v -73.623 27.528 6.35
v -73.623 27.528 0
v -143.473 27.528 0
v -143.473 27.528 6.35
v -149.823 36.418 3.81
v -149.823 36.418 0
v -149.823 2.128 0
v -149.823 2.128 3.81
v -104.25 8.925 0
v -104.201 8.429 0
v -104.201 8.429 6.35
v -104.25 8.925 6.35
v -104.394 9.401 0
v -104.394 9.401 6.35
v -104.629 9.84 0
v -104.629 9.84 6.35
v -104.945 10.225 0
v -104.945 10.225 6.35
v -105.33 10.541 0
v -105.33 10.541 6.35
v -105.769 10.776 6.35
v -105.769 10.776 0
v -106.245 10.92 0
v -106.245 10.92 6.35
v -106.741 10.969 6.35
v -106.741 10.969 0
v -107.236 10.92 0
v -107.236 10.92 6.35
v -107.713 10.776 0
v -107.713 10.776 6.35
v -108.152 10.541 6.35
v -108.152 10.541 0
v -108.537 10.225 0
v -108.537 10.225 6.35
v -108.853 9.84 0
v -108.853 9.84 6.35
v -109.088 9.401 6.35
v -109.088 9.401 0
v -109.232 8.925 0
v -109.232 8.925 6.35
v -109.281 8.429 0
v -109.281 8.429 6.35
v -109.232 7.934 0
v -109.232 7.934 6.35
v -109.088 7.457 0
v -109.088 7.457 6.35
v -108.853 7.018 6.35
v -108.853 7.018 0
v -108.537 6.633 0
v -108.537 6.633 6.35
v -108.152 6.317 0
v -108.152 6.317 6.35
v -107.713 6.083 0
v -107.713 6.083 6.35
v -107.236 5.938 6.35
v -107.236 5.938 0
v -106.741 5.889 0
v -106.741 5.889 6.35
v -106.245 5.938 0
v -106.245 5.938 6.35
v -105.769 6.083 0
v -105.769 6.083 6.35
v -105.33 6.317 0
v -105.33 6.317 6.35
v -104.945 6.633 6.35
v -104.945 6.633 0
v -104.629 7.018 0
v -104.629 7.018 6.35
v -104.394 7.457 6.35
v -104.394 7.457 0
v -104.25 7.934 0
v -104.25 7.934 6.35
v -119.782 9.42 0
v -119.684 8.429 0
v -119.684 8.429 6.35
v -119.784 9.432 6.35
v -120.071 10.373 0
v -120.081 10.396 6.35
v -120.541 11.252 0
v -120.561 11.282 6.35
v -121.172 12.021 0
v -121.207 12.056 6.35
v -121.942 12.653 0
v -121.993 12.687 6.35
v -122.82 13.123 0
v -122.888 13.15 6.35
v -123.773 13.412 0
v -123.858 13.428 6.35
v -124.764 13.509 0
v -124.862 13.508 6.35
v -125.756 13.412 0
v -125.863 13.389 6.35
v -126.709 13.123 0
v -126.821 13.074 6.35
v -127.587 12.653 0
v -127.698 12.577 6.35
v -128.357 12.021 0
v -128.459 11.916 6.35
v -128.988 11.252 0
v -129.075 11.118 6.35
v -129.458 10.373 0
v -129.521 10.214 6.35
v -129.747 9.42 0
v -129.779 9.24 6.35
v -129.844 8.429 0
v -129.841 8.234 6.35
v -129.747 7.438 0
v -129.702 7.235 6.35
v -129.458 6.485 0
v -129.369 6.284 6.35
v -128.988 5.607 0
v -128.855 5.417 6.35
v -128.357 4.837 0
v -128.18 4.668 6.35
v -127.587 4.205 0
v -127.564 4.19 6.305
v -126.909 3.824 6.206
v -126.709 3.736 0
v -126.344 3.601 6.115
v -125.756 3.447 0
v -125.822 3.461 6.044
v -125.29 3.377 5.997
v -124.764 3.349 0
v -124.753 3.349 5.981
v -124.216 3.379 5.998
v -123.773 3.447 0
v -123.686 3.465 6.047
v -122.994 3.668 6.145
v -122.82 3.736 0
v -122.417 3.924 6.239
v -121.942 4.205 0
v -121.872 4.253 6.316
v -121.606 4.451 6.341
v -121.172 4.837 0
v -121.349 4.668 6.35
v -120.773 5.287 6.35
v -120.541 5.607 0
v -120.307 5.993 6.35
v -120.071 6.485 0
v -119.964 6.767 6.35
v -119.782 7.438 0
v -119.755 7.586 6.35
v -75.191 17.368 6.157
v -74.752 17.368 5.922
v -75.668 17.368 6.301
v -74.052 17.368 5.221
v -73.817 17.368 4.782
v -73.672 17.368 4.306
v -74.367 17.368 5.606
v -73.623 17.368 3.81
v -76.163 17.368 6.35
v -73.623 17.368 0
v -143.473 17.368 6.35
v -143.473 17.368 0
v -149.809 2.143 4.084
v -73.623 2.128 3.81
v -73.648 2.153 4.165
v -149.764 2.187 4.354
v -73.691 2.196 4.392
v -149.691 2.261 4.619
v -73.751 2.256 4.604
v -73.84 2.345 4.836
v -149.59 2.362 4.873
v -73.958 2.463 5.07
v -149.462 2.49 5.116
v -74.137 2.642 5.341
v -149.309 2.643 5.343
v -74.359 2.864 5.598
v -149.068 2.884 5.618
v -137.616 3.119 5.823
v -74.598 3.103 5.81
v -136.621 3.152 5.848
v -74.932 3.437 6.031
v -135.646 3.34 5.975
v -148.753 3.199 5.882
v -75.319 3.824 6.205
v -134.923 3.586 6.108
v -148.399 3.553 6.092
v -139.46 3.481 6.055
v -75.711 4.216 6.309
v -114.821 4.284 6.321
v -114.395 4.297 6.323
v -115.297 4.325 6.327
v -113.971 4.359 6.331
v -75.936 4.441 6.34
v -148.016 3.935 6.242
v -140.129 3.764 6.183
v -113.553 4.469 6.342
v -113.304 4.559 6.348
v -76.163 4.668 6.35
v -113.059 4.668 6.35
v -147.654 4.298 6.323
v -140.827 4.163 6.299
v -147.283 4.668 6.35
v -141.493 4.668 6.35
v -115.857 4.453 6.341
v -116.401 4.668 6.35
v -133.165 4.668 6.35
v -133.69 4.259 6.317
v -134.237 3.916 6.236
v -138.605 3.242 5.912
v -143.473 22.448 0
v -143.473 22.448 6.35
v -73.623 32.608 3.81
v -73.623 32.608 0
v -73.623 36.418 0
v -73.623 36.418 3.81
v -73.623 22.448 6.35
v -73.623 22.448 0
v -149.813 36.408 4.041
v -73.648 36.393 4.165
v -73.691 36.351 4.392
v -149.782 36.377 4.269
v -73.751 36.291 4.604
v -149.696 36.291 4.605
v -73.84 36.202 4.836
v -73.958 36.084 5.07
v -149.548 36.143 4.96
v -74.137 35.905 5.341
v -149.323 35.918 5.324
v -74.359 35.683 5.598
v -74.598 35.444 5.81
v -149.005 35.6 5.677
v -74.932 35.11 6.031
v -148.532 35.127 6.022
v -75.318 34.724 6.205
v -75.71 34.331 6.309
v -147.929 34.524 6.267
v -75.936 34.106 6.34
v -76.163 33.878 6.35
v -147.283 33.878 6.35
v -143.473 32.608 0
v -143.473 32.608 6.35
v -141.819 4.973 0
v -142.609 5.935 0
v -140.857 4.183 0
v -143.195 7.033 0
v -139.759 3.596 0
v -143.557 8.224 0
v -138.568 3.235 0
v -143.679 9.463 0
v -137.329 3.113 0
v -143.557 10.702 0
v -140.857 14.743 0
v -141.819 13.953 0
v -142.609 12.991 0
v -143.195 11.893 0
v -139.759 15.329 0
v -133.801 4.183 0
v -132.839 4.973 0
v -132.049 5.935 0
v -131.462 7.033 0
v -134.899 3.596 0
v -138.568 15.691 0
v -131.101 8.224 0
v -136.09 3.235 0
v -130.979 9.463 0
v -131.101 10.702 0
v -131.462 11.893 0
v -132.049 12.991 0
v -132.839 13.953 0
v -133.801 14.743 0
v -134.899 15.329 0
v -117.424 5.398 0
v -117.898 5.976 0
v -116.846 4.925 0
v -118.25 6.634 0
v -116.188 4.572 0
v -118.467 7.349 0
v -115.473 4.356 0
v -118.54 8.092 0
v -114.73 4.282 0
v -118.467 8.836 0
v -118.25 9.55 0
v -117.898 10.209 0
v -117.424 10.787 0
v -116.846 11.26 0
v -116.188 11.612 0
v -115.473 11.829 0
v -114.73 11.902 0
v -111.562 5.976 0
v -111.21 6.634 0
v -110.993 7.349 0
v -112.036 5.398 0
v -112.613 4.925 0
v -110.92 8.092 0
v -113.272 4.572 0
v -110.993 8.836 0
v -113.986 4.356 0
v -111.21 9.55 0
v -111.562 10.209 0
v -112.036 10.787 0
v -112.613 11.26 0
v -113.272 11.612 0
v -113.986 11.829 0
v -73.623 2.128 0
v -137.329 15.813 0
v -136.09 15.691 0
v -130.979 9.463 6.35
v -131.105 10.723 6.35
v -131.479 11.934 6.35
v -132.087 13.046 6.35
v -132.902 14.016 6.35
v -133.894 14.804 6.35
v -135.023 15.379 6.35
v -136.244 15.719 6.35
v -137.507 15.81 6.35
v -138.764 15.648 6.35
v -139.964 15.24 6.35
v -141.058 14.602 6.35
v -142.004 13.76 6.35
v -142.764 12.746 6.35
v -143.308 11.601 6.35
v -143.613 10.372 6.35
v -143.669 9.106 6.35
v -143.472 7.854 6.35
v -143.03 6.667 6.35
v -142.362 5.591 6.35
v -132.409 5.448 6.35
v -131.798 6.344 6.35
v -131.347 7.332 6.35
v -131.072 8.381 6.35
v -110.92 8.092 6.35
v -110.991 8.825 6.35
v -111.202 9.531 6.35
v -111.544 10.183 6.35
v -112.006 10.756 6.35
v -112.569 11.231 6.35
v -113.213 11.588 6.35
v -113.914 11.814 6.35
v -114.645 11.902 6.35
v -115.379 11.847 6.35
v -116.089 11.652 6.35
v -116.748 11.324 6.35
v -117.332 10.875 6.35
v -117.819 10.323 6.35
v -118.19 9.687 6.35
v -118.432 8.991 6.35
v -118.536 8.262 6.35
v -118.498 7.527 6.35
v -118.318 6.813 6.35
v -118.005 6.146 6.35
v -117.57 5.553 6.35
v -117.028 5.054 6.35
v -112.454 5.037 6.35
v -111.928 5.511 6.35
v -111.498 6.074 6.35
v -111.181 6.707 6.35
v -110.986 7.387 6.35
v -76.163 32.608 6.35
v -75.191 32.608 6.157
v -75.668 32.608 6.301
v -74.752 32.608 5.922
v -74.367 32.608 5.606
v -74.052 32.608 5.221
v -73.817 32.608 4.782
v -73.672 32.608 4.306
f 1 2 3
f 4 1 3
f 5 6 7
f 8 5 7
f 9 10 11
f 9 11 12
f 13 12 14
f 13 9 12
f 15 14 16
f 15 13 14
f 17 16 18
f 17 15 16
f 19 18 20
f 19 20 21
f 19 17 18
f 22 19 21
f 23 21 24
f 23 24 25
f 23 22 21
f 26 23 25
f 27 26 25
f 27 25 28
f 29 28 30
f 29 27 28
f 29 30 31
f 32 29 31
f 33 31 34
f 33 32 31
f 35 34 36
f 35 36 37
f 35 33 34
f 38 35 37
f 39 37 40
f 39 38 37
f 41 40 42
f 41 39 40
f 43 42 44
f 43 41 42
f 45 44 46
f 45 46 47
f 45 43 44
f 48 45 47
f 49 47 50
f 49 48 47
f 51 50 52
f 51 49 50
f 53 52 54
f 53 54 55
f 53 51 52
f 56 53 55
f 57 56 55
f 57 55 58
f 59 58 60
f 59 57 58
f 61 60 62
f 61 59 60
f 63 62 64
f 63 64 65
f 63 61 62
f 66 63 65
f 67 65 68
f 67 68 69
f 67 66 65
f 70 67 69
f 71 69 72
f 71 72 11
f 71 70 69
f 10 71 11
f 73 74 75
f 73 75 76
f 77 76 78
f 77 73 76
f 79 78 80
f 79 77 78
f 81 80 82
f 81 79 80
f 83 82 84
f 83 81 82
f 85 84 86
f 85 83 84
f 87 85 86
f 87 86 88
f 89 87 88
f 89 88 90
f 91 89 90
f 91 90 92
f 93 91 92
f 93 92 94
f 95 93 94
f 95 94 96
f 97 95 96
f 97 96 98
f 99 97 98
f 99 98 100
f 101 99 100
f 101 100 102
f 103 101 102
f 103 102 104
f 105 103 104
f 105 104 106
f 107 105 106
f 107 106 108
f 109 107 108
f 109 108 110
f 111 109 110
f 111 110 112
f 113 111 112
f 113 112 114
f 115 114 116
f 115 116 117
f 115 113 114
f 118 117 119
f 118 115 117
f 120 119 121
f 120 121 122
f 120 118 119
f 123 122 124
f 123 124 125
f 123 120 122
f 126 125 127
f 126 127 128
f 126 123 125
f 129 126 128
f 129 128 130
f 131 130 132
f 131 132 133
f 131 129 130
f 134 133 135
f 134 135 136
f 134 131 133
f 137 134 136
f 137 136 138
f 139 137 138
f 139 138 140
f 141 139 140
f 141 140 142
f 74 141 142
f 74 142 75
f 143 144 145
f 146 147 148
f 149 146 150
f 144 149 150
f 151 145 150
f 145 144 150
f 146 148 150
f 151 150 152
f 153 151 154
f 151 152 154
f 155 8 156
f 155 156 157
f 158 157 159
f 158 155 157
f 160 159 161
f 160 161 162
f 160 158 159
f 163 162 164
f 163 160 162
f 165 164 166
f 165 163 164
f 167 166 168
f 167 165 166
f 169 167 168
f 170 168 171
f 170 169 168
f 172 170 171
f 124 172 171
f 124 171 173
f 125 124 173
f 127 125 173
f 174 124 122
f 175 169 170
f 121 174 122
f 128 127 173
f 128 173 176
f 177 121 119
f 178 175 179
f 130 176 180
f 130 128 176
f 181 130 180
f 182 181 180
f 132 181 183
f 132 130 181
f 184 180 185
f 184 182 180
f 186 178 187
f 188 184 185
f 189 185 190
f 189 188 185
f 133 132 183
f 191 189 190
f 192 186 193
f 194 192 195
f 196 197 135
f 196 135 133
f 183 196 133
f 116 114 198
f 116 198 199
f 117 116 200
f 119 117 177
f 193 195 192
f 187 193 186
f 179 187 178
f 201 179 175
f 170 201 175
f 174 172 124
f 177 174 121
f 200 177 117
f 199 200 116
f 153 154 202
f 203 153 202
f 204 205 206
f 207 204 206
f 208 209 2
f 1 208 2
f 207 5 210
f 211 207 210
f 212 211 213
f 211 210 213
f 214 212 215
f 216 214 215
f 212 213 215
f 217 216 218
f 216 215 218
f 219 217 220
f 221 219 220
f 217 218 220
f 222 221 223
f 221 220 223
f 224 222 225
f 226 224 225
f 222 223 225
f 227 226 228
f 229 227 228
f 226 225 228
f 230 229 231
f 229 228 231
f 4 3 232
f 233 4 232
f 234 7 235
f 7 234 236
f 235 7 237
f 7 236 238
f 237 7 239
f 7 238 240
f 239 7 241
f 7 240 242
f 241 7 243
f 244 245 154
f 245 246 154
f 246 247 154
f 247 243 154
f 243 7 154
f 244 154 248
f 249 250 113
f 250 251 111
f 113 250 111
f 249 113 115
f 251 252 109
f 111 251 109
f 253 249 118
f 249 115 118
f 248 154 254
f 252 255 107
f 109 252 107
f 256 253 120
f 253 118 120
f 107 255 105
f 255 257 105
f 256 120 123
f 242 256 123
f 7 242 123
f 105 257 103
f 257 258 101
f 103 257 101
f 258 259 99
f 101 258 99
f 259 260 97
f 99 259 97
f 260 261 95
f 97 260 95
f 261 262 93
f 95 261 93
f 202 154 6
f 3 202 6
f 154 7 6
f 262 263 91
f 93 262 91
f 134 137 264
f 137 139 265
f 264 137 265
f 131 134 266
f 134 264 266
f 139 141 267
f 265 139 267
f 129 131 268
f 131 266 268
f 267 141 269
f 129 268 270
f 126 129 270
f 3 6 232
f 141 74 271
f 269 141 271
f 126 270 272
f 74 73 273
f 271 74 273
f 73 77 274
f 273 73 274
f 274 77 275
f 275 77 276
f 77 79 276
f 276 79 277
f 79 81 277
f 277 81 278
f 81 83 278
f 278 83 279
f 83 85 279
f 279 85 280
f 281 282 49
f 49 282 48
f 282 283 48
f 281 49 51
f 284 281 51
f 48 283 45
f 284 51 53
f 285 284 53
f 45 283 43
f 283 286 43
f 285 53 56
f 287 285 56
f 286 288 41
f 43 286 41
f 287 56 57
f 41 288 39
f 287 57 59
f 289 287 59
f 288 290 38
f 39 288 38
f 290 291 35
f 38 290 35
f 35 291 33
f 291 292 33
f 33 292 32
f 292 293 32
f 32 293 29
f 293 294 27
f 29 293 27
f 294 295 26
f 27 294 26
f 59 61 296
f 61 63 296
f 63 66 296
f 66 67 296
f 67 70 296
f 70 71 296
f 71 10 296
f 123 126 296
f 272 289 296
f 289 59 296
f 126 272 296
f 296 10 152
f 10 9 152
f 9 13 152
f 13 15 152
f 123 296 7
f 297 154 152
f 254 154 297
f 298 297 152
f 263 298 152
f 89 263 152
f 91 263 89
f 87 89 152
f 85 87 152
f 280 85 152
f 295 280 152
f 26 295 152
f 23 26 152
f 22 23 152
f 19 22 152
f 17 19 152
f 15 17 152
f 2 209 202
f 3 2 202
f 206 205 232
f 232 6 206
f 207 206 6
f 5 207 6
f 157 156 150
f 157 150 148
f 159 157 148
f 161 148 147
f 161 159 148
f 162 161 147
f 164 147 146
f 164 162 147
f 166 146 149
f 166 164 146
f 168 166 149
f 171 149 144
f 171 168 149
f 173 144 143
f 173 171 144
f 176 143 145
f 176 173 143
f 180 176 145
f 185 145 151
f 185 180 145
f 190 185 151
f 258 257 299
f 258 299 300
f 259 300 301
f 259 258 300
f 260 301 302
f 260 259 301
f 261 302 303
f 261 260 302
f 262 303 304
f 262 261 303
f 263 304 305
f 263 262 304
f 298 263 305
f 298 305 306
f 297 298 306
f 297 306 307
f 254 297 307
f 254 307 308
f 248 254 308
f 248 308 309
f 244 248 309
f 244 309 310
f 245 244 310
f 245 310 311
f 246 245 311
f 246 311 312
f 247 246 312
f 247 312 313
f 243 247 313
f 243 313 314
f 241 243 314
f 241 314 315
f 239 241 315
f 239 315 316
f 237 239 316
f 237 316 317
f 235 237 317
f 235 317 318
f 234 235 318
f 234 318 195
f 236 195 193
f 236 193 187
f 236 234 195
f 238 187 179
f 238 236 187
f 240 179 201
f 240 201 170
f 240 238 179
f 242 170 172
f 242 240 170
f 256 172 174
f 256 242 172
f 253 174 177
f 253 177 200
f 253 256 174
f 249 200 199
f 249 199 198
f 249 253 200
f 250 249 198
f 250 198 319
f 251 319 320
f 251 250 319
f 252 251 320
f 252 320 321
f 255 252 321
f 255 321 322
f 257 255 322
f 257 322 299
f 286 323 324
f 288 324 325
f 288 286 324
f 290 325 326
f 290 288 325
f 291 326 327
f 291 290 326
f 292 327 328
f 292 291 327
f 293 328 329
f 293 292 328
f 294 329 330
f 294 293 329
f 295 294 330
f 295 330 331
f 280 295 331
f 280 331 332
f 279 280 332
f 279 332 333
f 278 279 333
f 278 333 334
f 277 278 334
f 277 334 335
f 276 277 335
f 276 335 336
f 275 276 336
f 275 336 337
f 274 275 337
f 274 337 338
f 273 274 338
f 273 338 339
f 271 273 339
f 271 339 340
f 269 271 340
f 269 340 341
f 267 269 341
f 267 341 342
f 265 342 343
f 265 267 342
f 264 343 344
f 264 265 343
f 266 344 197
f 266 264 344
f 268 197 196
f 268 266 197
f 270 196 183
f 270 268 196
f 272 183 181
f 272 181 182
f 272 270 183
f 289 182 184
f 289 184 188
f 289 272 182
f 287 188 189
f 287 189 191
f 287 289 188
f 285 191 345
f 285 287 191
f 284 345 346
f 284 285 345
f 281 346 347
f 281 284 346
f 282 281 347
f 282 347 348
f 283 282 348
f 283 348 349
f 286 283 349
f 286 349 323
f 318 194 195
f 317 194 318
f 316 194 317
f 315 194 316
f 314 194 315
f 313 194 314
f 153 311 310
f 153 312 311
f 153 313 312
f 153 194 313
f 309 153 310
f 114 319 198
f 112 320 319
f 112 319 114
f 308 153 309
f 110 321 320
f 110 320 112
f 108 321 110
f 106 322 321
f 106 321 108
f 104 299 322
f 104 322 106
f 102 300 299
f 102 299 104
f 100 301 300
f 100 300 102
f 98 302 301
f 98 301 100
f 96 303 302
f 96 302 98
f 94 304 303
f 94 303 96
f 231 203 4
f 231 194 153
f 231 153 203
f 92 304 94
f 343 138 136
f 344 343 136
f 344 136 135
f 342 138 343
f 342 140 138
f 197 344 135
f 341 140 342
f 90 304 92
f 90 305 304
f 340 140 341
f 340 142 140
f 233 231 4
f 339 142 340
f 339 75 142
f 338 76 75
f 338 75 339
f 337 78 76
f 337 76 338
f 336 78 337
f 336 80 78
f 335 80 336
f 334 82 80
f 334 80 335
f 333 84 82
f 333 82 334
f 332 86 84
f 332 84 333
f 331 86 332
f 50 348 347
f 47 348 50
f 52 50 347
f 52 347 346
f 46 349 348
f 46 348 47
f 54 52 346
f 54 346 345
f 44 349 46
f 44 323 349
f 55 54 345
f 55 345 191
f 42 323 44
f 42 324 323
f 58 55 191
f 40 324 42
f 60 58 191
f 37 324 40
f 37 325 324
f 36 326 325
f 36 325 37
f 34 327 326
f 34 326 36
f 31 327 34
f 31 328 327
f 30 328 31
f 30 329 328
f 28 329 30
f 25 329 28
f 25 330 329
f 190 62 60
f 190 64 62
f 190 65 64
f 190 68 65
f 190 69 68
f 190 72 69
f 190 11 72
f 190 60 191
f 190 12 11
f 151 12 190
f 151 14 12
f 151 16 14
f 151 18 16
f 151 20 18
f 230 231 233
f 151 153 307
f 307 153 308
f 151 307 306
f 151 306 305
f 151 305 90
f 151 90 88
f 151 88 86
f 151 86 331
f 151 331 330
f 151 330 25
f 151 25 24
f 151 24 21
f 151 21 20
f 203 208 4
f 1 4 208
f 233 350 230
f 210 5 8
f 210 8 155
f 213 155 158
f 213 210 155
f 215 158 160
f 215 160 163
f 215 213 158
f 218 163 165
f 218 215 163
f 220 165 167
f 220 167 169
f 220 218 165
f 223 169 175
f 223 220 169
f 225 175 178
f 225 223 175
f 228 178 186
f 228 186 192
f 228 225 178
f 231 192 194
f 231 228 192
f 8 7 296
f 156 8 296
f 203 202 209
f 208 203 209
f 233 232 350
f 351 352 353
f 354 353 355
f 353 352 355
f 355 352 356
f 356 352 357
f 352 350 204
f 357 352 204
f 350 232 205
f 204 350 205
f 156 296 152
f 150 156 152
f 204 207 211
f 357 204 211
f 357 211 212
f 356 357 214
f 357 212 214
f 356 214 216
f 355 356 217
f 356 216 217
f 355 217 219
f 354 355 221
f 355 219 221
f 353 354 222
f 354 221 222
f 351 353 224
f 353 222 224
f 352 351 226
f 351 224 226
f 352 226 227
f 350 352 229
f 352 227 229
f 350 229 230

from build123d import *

# Parameters (mm, degrees)
F0_R         = 6.35
F0_R_2       = 5.08
F0_R_3       = 3.81
F0_R_4       = 2.54
F1_DEPTH     = 6.35
F2_T1_DEPTH  = 88.9
F2_T3_DEPTH  = 46.99
F2_T5_DEPTH  = 10.16
F2_T10_DEPTH = 27.94


# Not quite as in the source:
# - a fillet or chamfer that OpenCascade refuses, or shapes differently, is made with other operations: its cross-section is extruded or revolved along the edge and cut away or added


with BuildPart() as f1:
    # F0 (on Top) → F1 (new body)
    with BuildSketch(Plane.XY):
        Polygon((-149.8234506369, 2.128423816), (-73.6234506369, 2.128423816), (-73.6234506369, 17.368423816), (-143.4734506369, 17.368423816), (-143.4734506369, 22.448423816), (-73.6234506369, 22.448423816), (-73.6234506369, 27.528423816), (-143.4734506369, 27.528423816), (-143.4734506369, 32.608423816), (-73.6234506369, 32.608423816), (-73.6234506369, 36.418423816), (-149.8234506369, 36.418423816), align=None)
        with Locations((-137.3288496289, 9.4627772336)):
            Circle(F0_R, mode=Mode.SUBTRACT)
        with Locations((-124.7644872946, 8.4292863984)):
            Circle(F0_R_2, mode=Mode.SUBTRACT)
        with Locations((-114.7297660142, 8.0924675546)):
            Circle(F0_R_3, mode=Mode.SUBTRACT)
        with Locations((-106.7409519207, 8.4292863984)):
            Circle(F0_R_4, mode=Mode.SUBTRACT)
    extrude(amount=F1_DEPTH)

    # F2: fillet of radius 2.54 on 5 edges, made by hand

    # F2_s2 → F2_t1 (cut)
    with BuildSketch(Plane.YZ.offset(-156.1734506369)):
        with BuildLine():
            ThreePointArc((36.418423816, 3.81), (35.6744750402, 5.6060512242), (33.878423816, 6.35))
            Line((33.878423816, 6.35), (36.418423816, 6.35))
            Line((36.418423816, 6.35), (36.418423816, 3.81))
        make_face()
        with BuildLine():
            ThreePointArc((2.128423816, 3.81), (2.8723725918, 5.6060512242), (4.668423816, 6.35))
            Line((4.668423816, 6.35), (2.128423816, 6.35))
            Line((2.128423816, 6.35), (2.128423816, 3.81))
        make_face()
    extrude(amount=F2_T1_DEPTH, mode=Mode.SUBTRACT)

    # F2_s4 → F2_t3 (cut)
    with BuildSketch(Plane.XZ.offset(-42.768423816)):
        with BuildLine():
            ThreePointArc((-149.8234506369, 3.81), (-149.0795018611, 5.6060512242), (-147.2834506369, 6.35))
            Line((-147.2834506369, 6.35), (-149.8234506369, 6.35))
            Line((-149.8234506369, 6.35), (-149.8234506369, 3.81))
        make_face()
    extrude(amount=F2_T3_DEPTH, mode=Mode.SUBTRACT)

    # F2_s6 → F2_t5 (cut)
    with BuildSketch(Plane.XZ.offset(-42.768423816)):
        with BuildLine():
            ThreePointArc((-73.6234506369, 3.81), (-74.3673994126, 5.6060512242), (-76.1634506369, 6.35))
            Line((-76.1634506369, 6.35), (-73.6234506369, 6.35))
            Line((-73.6234506369, 6.35), (-73.6234506369, 3.81))
        make_face()
    extrude(amount=F2_T5_DEPTH, mode=Mode.SUBTRACT)


with BuildPart() as f2_tool8:
    # F2_s9 → F2_t10 (new body)
    with BuildSketch(Plane.XZ.offset(4.221576184)):
        with BuildLine():
            ThreePointArc((-73.6234506369, 3.81), (-74.3673994126, 5.6060512242), (-76.1634506369, 6.35))
            Line((-76.1634506369, 6.35), (-73.6234506369, 6.35))
            Line((-73.6234506369, 6.35), (-73.6234506369, 3.81))
        make_face()
    extrude(amount=-F2_T10_DEPTH)

    split(bisect_by=Plane.XZ.offset(-22.448423816), keep=Keep.TOP)


with BuildPart() as f1_1:
    add(f1.part)

    # F2_t7: cut F2_tool8
    add(f2_tool8.part, mode=Mode.SUBTRACT)


solid = f1_1.part
